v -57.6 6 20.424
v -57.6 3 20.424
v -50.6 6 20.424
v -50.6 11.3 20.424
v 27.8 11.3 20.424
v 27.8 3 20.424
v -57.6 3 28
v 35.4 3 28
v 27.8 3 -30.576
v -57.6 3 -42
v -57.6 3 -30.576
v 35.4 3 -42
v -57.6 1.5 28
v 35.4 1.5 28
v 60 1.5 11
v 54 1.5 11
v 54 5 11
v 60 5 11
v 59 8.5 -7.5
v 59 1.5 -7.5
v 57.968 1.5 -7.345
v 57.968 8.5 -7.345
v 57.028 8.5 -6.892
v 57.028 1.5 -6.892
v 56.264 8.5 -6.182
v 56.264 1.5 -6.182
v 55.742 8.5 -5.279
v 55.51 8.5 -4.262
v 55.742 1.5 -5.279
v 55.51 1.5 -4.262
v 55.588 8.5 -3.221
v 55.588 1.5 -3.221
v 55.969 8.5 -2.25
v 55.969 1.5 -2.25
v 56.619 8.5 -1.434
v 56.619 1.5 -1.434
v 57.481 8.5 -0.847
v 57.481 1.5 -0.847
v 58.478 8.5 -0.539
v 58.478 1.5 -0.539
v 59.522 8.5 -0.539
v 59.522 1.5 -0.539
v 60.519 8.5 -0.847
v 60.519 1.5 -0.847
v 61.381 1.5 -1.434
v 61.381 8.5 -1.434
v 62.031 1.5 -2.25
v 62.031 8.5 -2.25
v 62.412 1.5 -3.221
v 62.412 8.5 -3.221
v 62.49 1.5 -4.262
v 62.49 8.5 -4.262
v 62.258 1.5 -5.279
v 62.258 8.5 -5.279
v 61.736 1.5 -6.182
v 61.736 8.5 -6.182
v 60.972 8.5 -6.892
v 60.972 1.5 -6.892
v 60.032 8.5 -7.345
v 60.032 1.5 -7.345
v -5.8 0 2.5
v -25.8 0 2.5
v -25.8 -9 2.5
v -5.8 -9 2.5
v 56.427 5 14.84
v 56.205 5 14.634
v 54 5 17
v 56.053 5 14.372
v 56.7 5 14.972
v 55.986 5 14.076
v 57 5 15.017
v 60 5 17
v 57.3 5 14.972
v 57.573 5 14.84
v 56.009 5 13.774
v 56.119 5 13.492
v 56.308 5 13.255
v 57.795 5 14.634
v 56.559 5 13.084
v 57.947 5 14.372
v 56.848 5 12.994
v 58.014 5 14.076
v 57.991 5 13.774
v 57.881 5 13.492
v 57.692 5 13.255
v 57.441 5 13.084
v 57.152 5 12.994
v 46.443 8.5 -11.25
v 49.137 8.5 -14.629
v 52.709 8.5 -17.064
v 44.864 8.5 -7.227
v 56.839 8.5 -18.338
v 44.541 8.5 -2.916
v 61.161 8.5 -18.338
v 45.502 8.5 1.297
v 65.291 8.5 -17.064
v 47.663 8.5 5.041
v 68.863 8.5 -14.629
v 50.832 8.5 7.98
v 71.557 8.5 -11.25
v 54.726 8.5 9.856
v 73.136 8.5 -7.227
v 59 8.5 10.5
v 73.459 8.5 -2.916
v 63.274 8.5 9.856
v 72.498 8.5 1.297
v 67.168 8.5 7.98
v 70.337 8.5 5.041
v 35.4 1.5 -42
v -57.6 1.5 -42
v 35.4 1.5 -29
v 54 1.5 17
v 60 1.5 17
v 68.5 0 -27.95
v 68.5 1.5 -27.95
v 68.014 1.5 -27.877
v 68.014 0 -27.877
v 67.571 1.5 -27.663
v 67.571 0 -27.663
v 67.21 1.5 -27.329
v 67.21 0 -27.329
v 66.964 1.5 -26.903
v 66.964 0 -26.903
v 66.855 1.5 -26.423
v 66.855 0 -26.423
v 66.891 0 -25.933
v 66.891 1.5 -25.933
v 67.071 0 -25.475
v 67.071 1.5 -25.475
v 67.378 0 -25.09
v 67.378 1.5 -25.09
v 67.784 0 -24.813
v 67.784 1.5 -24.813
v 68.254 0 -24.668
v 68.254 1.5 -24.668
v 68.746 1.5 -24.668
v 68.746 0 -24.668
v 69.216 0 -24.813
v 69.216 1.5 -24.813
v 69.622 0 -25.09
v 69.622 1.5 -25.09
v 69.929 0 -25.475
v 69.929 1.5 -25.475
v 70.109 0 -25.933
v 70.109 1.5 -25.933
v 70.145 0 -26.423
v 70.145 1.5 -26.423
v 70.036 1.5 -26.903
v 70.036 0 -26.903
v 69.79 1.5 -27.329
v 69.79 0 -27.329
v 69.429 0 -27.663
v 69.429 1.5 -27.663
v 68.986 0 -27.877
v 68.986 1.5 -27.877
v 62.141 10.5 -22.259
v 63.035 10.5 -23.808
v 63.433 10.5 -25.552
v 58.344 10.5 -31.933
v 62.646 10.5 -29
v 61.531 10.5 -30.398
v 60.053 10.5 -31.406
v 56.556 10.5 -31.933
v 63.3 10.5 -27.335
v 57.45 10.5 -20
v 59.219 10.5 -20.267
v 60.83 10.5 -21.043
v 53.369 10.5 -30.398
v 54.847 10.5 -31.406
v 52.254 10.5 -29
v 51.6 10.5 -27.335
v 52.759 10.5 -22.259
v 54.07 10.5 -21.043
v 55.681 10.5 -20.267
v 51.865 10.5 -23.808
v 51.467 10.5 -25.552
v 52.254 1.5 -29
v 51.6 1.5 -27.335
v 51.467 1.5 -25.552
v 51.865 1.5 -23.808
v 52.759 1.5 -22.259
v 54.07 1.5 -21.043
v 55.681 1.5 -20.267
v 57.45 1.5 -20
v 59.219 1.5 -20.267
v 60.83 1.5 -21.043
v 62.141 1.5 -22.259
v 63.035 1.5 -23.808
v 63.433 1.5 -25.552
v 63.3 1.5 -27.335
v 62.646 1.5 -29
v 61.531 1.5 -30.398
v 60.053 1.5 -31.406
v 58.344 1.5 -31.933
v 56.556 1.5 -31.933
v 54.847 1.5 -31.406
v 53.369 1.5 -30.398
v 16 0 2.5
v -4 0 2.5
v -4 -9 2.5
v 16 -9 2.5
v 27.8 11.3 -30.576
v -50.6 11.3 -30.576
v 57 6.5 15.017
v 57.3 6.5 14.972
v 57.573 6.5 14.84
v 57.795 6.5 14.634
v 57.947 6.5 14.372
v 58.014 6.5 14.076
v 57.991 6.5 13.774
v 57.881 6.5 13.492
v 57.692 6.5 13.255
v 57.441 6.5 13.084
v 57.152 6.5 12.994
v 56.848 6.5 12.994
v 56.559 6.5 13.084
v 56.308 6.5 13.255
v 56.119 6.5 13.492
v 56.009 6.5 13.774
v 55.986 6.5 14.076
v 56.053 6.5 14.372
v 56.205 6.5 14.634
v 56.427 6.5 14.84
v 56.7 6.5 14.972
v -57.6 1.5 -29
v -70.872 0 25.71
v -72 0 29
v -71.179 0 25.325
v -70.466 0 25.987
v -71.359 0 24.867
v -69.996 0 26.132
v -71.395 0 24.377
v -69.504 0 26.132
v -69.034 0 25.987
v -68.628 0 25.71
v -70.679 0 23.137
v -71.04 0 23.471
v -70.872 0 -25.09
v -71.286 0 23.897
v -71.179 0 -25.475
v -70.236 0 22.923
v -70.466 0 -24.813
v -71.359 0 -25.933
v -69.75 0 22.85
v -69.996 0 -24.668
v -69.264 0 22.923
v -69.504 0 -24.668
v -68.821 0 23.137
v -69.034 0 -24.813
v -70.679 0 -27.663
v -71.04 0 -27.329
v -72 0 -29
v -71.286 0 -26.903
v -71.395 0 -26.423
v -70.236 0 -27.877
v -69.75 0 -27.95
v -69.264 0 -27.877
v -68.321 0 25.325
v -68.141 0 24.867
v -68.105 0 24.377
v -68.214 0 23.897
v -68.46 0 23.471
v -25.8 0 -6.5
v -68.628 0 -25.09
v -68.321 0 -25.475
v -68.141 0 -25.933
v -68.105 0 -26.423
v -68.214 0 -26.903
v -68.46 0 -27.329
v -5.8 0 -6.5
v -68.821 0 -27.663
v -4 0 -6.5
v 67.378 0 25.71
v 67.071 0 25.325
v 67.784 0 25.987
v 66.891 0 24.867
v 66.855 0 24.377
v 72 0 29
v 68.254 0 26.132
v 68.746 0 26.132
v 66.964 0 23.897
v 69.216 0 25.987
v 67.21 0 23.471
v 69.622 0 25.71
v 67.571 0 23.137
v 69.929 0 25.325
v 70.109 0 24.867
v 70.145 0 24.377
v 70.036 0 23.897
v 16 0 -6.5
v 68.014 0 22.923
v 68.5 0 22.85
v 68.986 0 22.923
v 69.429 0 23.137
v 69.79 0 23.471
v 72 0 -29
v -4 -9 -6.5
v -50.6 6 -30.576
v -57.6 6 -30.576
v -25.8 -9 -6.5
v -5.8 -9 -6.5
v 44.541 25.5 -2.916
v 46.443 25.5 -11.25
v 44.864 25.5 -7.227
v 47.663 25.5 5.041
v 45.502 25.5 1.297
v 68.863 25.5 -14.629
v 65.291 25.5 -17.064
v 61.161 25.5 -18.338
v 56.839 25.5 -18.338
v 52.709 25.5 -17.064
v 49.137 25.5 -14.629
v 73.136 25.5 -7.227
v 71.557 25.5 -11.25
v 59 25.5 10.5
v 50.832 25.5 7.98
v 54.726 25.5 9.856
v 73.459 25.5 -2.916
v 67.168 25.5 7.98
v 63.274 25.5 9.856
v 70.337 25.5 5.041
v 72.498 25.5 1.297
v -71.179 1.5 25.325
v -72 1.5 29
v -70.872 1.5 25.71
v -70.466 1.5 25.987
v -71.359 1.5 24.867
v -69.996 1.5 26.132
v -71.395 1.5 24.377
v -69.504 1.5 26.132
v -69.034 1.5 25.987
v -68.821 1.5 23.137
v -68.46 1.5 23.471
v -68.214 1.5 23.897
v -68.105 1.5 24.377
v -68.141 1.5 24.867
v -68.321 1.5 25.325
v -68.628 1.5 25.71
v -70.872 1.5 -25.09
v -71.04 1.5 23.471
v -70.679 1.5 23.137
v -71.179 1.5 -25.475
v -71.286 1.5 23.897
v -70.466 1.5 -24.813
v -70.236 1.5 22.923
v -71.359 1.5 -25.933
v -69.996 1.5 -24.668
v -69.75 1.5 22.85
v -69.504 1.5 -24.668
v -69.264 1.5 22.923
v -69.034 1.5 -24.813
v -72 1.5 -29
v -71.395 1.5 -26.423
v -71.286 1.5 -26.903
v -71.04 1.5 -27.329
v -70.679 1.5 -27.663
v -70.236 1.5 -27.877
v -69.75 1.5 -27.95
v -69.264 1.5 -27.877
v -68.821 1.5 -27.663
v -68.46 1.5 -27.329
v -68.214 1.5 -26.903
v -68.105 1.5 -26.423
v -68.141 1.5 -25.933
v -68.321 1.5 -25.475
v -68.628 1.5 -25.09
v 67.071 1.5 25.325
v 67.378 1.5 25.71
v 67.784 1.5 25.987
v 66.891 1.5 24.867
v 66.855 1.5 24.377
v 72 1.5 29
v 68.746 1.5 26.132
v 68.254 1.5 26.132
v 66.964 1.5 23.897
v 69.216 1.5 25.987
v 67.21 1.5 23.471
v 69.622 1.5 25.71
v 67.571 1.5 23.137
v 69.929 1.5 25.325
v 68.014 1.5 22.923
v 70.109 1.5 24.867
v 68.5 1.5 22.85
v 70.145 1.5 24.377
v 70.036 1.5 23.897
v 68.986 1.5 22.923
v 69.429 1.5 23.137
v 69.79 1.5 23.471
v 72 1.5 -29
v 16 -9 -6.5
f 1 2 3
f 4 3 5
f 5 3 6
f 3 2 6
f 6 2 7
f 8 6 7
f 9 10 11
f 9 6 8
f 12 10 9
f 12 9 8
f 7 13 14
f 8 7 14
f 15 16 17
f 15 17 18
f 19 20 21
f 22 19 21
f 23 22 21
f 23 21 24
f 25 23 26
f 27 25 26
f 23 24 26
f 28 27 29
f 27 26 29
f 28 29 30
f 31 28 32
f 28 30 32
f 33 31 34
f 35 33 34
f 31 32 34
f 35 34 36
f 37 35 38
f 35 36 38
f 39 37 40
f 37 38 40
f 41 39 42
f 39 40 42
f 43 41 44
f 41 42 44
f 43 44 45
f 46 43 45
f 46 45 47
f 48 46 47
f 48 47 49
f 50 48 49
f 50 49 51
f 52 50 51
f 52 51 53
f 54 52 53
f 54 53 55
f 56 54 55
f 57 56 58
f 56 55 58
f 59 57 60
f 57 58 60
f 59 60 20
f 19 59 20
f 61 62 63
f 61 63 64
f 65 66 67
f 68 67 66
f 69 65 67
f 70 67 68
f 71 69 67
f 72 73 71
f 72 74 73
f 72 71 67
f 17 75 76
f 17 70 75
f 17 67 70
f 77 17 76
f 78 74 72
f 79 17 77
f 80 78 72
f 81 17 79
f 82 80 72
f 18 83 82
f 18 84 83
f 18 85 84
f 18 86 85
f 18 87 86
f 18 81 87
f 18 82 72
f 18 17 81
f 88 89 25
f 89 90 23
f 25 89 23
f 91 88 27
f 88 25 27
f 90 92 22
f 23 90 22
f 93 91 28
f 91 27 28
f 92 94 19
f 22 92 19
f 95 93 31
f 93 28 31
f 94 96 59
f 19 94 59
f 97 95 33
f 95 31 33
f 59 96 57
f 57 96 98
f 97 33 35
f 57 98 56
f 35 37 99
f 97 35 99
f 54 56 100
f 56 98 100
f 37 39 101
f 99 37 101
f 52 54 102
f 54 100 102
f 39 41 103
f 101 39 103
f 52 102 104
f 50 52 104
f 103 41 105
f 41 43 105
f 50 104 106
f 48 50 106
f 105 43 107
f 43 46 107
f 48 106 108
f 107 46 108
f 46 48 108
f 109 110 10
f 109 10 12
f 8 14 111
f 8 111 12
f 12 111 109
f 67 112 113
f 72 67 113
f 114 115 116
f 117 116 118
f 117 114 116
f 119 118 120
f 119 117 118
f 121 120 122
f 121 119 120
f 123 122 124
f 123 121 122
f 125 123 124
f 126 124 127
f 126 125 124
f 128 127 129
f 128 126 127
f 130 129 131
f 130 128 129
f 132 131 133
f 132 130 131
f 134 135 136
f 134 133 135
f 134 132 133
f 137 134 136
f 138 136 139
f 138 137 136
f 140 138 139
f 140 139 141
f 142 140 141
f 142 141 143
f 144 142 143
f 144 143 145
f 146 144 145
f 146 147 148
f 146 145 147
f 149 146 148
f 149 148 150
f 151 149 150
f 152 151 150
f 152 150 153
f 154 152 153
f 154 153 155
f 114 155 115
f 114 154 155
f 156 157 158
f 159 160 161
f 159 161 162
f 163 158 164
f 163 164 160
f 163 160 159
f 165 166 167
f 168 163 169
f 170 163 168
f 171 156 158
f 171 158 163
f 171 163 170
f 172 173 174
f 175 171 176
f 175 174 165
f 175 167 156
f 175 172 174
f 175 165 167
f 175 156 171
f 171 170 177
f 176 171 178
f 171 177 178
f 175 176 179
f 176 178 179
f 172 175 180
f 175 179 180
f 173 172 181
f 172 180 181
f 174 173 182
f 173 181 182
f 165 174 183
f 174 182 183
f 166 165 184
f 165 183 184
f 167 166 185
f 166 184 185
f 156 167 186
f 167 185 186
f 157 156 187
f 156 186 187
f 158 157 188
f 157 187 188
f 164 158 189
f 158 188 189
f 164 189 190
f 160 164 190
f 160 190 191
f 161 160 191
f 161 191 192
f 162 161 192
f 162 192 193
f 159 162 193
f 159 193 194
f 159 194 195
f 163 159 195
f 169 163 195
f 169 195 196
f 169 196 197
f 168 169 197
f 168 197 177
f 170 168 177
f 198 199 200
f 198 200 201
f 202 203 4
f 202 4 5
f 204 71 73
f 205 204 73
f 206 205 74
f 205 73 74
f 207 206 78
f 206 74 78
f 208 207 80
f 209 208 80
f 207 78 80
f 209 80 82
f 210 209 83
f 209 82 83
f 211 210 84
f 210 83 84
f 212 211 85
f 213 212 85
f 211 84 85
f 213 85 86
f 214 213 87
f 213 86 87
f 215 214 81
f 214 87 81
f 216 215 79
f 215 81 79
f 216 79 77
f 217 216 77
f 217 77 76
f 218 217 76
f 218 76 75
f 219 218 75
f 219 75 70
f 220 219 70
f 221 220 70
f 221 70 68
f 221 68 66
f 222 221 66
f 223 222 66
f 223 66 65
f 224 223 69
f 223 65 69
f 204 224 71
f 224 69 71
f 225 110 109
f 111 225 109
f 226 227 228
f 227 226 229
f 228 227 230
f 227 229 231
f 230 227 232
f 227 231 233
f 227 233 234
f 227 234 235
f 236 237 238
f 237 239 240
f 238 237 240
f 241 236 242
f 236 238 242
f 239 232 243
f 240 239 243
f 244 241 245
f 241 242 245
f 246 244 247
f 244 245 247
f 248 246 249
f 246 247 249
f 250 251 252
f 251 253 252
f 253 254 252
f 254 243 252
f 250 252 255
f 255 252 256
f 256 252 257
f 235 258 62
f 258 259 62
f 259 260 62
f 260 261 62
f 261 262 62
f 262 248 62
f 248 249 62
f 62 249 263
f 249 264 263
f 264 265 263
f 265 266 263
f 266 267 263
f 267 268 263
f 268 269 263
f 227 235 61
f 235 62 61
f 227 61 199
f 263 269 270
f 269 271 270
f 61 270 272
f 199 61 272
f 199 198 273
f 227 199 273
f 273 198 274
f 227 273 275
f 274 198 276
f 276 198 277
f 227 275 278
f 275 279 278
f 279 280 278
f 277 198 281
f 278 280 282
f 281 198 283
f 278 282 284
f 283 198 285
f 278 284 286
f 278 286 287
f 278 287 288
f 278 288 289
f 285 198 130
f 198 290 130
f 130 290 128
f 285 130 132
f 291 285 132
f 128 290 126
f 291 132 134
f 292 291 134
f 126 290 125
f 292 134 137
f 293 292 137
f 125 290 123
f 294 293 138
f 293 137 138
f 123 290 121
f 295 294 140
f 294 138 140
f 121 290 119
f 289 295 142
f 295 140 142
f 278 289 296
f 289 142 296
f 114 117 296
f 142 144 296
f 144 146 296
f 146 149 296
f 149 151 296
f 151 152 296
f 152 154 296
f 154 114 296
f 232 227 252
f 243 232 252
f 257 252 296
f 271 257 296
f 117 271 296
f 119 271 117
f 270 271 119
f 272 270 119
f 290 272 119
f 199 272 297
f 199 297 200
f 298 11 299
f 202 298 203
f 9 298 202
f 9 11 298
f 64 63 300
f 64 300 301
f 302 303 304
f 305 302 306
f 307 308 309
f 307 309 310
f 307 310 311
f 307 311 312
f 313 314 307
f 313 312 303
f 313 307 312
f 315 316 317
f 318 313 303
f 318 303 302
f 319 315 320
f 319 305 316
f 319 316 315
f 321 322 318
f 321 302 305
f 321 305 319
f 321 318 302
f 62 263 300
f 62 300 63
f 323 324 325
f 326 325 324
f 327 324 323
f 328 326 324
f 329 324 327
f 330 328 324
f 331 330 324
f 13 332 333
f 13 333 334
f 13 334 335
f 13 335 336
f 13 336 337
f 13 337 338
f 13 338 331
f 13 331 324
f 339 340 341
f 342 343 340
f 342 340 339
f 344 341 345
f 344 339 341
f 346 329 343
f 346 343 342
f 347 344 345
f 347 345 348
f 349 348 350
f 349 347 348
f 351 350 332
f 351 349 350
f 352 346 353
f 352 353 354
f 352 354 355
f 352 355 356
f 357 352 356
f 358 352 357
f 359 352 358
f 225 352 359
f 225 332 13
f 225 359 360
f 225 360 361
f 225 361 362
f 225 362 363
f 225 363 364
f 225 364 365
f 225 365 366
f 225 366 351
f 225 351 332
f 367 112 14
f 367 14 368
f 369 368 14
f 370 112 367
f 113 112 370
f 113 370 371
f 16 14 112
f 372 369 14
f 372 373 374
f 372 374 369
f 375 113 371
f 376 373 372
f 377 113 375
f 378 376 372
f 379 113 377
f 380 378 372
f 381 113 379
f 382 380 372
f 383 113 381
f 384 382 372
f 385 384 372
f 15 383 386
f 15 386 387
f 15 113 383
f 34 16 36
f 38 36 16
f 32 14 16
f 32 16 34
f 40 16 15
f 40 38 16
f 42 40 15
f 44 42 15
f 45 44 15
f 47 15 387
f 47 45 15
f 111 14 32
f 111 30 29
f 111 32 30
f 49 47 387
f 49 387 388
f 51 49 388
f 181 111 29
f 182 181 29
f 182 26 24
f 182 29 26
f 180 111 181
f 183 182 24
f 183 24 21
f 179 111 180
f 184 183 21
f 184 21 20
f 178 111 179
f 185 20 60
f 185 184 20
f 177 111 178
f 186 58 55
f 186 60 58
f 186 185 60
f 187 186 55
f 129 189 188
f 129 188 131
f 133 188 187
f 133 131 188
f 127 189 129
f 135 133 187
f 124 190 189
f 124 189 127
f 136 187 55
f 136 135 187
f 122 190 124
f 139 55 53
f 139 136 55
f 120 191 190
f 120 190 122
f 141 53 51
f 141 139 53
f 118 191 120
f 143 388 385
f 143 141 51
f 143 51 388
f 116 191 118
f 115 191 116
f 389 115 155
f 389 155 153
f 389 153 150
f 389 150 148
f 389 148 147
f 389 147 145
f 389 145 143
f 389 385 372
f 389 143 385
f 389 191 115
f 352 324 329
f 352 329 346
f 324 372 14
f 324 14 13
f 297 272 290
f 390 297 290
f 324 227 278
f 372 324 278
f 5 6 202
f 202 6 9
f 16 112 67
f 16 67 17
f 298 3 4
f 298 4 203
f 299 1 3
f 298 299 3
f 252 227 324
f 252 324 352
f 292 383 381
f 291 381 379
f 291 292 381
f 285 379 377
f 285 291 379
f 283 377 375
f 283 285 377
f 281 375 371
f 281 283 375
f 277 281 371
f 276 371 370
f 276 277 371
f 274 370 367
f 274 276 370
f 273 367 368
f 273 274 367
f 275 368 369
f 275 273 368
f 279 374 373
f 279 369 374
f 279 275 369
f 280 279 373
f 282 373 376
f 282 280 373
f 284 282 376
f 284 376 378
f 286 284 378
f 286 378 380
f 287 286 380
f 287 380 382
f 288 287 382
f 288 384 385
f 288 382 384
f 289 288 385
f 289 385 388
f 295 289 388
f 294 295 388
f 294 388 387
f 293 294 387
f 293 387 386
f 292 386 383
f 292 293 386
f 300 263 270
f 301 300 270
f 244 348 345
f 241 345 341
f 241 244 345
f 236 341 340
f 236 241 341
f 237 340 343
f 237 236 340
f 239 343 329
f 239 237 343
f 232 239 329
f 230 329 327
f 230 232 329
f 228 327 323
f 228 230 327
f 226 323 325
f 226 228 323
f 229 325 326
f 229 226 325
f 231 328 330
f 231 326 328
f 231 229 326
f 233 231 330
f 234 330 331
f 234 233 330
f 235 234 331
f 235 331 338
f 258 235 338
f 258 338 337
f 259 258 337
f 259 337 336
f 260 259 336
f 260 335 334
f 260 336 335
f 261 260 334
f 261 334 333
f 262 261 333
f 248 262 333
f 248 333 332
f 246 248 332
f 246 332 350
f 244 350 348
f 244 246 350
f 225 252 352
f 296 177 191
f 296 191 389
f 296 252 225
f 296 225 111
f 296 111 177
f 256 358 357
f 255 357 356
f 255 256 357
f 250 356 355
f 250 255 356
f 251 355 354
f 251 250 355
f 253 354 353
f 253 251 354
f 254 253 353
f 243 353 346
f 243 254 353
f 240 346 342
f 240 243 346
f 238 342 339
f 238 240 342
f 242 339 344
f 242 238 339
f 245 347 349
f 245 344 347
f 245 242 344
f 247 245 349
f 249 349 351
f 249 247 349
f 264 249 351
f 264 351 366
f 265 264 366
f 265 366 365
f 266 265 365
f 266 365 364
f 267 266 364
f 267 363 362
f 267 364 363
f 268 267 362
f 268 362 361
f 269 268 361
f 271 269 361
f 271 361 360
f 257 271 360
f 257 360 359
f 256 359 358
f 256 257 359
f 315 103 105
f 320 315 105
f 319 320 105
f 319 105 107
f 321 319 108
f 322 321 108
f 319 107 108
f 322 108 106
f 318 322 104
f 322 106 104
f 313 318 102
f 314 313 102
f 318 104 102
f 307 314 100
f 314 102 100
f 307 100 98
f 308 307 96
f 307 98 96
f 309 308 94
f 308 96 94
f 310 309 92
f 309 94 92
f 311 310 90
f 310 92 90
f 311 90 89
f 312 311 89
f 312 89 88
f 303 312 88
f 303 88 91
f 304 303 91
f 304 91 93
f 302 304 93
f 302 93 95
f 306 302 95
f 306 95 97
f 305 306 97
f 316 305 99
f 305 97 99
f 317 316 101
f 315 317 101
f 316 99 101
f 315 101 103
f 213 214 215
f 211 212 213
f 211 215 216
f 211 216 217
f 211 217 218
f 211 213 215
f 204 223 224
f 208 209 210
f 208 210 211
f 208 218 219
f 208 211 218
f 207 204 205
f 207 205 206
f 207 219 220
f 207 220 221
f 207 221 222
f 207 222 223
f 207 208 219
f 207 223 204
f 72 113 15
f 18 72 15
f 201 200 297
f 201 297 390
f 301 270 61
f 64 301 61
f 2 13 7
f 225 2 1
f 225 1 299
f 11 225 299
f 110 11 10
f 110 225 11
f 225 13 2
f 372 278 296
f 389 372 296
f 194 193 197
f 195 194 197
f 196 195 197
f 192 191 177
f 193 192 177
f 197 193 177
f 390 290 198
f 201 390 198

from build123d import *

# Parameters (mm, degrees)
SKETCH1_W            = 144
SKETCH1_H            = 58
BOSS_EXTRUDE2_DEPTH  = 1.5
SKETCH2_W            = 93
SKETCH2_H            = 70
BOSS_EXTRUDE3_DEPTH  = 1.5
SKETCH3_W            = 78.4
SKETCH3_H            = 51
BOSS_EXTRUDE4_DEPTH  = 8.3
SKETCH4_W            = 7
SKETCH4_H            = 51
BOSS_EXTRUDE5_DEPTH  = 3
SKETCH5_R            = 3.5
BOSS_EXTRUDE6_DEPTH  = 7
SKETCH6_R            = 14.5
BOSS_EXTRUDE7_DEPTH  = 17
SKETCH8_R            = 6
BOSS_EXTRUDE8_DEPTH  = 9
SKETCH9_W            = 6
SKETCH9_H            = 6
BOSS_EXTRUDE9_DEPTH  = 3.5
SKETCH10_R           = 1.016941324
BOSS_EXTRUDE10_DEPTH = 1.5
SKETCH11_W           = 20
SKETCH11_H           = 9
BOSS_EXTRUDE11_DEPTH = 9
SKETCH12_R           = 1.65
CUT_EXTRUDE2_DEPTH   = 10


with BuildPart() as part:
    # Sketch1 → Boss-Extrude2 (new body)
    with BuildSketch(Plane(origin=(0, 0, 0), x_dir=(1, 0, 0), z_dir=(0, 1, 0))):
        Rectangle(SKETCH1_W, SKETCH1_H)
    extrude(amount=BOSS_EXTRUDE2_DEPTH)

    # Sketch2 → Boss-Extrude3 (add)
    with BuildSketch(Plane(origin=(0, 1.5, 0), x_dir=(1, 0, 0), z_dir=(0, 1, 0))):
        with Locations((-11.1, 7)):
            Rectangle(SKETCH2_W, SKETCH2_H)
    extrude(amount=BOSS_EXTRUDE3_DEPTH)

    # Sketch3 → Boss-Extrude4 (add)
    with BuildSketch(Plane(origin=(0, 3, 0), x_dir=(1, 0, 0), z_dir=(0, 1, 0))):
        with Locations((-11.4, 5.076084889)):
            Rectangle(SKETCH3_W, SKETCH3_H)
    extrude(amount=BOSS_EXTRUDE4_DEPTH)

    # Sketch4 → Boss-Extrude5 (add)
    with BuildSketch(Plane(origin=(0, 3, 0), x_dir=(1, 0, 0), z_dir=(0, 1, 0))):
        with Locations((-54.1, 5.076084889)):
            Rectangle(SKETCH4_W, SKETCH4_H)
    extrude(amount=BOSS_EXTRUDE5_DEPTH)

    # Sketch5 → Boss-Extrude6 (add)
    with BuildSketch(Plane(origin=(0, 1.5, 0), x_dir=(1, 0, 0), z_dir=(0, 1, 0))):
        with Locations(Location((59, 4, 0), (0, 0, 90))):
            Circle(SKETCH5_R)
    extrude(amount=BOSS_EXTRUDE6_DEPTH)

    # Sketch6 → Boss-Extrude7 (add)
    with BuildSketch(Plane(origin=(0, 8.5, 0), x_dir=(1, 0, 0), z_dir=(0, 1, 0))):
        with Locations(Location((59, 4, 0), (0, 0, 270))):
            Circle(SKETCH6_R)
    extrude(amount=BOSS_EXTRUDE7_DEPTH)

    # Sketch8 → Boss-Extrude8 (add)
    with BuildSketch(Plane(origin=(0, 1.5, 0), x_dir=(1, 0, 0), z_dir=(0, 1, 0))):
        with Locations(Location((57.45, 26, 0), (0, 0, 150))):
            Circle(SKETCH8_R)
    extrude(amount=BOSS_EXTRUDE8_DEPTH)

    # Sketch9 → Boss-Extrude9 (add)
    with BuildSketch(Plane(origin=(0, 1.5, 0), x_dir=(1, 0, 0), z_dir=(0, 1, 0))):
        with Locations((57, -14)):
            Rectangle(SKETCH9_W, SKETCH9_H)
    extrude(amount=BOSS_EXTRUDE9_DEPTH)

    # Sketch10 → Boss-Extrude10 (add)
    with BuildSketch(Plane(origin=(0, 5, 0), x_dir=(1, 0, 0), z_dir=(0, 1, 0))):
        with Locations(Location((57, -14, 0), (0, 0, 270))):
            Circle(SKETCH10_R)
    extrude(amount=BOSS_EXTRUDE10_DEPTH)

    # Sketch11 → Boss-Extrude11 (add)
    with BuildSketch(Plane.XZ):
        with Locations((6, -2)):
            Rectangle(SKETCH11_W, SKETCH11_H)
        with Locations((-15.8, -2)):
            Rectangle(SKETCH11_W, SKETCH11_H)
    extrude(amount=BOSS_EXTRUDE11_DEPTH)

    # Sketch12 → Cut-Extrude2 (cut)
    with BuildSketch(Plane(origin=(0, 0, 0), x_dir=(1, 0, 0), z_dir=(0, 1, 0))):
        with Locations(Location((68.5, 26.3, 0), (0, 0, 90))):
            Circle(SKETCH12_R)
        with Locations(Location((68.5, -24.5, 0), (0, 0, 90))):
            Circle(SKETCH12_R)
        with Locations(Location((-69.75, 26.3, 0), (0, 0, 90))):
            Circle(SKETCH12_R)
        with Locations(Location((-69.75, -24.5, 0), (0, 0, 90))):
            Circle(SKETCH12_R)
    extrude(amount=CUT_EXTRUDE2_DEPTH, mode=Mode.SUBTRACT)


solid = part.part
